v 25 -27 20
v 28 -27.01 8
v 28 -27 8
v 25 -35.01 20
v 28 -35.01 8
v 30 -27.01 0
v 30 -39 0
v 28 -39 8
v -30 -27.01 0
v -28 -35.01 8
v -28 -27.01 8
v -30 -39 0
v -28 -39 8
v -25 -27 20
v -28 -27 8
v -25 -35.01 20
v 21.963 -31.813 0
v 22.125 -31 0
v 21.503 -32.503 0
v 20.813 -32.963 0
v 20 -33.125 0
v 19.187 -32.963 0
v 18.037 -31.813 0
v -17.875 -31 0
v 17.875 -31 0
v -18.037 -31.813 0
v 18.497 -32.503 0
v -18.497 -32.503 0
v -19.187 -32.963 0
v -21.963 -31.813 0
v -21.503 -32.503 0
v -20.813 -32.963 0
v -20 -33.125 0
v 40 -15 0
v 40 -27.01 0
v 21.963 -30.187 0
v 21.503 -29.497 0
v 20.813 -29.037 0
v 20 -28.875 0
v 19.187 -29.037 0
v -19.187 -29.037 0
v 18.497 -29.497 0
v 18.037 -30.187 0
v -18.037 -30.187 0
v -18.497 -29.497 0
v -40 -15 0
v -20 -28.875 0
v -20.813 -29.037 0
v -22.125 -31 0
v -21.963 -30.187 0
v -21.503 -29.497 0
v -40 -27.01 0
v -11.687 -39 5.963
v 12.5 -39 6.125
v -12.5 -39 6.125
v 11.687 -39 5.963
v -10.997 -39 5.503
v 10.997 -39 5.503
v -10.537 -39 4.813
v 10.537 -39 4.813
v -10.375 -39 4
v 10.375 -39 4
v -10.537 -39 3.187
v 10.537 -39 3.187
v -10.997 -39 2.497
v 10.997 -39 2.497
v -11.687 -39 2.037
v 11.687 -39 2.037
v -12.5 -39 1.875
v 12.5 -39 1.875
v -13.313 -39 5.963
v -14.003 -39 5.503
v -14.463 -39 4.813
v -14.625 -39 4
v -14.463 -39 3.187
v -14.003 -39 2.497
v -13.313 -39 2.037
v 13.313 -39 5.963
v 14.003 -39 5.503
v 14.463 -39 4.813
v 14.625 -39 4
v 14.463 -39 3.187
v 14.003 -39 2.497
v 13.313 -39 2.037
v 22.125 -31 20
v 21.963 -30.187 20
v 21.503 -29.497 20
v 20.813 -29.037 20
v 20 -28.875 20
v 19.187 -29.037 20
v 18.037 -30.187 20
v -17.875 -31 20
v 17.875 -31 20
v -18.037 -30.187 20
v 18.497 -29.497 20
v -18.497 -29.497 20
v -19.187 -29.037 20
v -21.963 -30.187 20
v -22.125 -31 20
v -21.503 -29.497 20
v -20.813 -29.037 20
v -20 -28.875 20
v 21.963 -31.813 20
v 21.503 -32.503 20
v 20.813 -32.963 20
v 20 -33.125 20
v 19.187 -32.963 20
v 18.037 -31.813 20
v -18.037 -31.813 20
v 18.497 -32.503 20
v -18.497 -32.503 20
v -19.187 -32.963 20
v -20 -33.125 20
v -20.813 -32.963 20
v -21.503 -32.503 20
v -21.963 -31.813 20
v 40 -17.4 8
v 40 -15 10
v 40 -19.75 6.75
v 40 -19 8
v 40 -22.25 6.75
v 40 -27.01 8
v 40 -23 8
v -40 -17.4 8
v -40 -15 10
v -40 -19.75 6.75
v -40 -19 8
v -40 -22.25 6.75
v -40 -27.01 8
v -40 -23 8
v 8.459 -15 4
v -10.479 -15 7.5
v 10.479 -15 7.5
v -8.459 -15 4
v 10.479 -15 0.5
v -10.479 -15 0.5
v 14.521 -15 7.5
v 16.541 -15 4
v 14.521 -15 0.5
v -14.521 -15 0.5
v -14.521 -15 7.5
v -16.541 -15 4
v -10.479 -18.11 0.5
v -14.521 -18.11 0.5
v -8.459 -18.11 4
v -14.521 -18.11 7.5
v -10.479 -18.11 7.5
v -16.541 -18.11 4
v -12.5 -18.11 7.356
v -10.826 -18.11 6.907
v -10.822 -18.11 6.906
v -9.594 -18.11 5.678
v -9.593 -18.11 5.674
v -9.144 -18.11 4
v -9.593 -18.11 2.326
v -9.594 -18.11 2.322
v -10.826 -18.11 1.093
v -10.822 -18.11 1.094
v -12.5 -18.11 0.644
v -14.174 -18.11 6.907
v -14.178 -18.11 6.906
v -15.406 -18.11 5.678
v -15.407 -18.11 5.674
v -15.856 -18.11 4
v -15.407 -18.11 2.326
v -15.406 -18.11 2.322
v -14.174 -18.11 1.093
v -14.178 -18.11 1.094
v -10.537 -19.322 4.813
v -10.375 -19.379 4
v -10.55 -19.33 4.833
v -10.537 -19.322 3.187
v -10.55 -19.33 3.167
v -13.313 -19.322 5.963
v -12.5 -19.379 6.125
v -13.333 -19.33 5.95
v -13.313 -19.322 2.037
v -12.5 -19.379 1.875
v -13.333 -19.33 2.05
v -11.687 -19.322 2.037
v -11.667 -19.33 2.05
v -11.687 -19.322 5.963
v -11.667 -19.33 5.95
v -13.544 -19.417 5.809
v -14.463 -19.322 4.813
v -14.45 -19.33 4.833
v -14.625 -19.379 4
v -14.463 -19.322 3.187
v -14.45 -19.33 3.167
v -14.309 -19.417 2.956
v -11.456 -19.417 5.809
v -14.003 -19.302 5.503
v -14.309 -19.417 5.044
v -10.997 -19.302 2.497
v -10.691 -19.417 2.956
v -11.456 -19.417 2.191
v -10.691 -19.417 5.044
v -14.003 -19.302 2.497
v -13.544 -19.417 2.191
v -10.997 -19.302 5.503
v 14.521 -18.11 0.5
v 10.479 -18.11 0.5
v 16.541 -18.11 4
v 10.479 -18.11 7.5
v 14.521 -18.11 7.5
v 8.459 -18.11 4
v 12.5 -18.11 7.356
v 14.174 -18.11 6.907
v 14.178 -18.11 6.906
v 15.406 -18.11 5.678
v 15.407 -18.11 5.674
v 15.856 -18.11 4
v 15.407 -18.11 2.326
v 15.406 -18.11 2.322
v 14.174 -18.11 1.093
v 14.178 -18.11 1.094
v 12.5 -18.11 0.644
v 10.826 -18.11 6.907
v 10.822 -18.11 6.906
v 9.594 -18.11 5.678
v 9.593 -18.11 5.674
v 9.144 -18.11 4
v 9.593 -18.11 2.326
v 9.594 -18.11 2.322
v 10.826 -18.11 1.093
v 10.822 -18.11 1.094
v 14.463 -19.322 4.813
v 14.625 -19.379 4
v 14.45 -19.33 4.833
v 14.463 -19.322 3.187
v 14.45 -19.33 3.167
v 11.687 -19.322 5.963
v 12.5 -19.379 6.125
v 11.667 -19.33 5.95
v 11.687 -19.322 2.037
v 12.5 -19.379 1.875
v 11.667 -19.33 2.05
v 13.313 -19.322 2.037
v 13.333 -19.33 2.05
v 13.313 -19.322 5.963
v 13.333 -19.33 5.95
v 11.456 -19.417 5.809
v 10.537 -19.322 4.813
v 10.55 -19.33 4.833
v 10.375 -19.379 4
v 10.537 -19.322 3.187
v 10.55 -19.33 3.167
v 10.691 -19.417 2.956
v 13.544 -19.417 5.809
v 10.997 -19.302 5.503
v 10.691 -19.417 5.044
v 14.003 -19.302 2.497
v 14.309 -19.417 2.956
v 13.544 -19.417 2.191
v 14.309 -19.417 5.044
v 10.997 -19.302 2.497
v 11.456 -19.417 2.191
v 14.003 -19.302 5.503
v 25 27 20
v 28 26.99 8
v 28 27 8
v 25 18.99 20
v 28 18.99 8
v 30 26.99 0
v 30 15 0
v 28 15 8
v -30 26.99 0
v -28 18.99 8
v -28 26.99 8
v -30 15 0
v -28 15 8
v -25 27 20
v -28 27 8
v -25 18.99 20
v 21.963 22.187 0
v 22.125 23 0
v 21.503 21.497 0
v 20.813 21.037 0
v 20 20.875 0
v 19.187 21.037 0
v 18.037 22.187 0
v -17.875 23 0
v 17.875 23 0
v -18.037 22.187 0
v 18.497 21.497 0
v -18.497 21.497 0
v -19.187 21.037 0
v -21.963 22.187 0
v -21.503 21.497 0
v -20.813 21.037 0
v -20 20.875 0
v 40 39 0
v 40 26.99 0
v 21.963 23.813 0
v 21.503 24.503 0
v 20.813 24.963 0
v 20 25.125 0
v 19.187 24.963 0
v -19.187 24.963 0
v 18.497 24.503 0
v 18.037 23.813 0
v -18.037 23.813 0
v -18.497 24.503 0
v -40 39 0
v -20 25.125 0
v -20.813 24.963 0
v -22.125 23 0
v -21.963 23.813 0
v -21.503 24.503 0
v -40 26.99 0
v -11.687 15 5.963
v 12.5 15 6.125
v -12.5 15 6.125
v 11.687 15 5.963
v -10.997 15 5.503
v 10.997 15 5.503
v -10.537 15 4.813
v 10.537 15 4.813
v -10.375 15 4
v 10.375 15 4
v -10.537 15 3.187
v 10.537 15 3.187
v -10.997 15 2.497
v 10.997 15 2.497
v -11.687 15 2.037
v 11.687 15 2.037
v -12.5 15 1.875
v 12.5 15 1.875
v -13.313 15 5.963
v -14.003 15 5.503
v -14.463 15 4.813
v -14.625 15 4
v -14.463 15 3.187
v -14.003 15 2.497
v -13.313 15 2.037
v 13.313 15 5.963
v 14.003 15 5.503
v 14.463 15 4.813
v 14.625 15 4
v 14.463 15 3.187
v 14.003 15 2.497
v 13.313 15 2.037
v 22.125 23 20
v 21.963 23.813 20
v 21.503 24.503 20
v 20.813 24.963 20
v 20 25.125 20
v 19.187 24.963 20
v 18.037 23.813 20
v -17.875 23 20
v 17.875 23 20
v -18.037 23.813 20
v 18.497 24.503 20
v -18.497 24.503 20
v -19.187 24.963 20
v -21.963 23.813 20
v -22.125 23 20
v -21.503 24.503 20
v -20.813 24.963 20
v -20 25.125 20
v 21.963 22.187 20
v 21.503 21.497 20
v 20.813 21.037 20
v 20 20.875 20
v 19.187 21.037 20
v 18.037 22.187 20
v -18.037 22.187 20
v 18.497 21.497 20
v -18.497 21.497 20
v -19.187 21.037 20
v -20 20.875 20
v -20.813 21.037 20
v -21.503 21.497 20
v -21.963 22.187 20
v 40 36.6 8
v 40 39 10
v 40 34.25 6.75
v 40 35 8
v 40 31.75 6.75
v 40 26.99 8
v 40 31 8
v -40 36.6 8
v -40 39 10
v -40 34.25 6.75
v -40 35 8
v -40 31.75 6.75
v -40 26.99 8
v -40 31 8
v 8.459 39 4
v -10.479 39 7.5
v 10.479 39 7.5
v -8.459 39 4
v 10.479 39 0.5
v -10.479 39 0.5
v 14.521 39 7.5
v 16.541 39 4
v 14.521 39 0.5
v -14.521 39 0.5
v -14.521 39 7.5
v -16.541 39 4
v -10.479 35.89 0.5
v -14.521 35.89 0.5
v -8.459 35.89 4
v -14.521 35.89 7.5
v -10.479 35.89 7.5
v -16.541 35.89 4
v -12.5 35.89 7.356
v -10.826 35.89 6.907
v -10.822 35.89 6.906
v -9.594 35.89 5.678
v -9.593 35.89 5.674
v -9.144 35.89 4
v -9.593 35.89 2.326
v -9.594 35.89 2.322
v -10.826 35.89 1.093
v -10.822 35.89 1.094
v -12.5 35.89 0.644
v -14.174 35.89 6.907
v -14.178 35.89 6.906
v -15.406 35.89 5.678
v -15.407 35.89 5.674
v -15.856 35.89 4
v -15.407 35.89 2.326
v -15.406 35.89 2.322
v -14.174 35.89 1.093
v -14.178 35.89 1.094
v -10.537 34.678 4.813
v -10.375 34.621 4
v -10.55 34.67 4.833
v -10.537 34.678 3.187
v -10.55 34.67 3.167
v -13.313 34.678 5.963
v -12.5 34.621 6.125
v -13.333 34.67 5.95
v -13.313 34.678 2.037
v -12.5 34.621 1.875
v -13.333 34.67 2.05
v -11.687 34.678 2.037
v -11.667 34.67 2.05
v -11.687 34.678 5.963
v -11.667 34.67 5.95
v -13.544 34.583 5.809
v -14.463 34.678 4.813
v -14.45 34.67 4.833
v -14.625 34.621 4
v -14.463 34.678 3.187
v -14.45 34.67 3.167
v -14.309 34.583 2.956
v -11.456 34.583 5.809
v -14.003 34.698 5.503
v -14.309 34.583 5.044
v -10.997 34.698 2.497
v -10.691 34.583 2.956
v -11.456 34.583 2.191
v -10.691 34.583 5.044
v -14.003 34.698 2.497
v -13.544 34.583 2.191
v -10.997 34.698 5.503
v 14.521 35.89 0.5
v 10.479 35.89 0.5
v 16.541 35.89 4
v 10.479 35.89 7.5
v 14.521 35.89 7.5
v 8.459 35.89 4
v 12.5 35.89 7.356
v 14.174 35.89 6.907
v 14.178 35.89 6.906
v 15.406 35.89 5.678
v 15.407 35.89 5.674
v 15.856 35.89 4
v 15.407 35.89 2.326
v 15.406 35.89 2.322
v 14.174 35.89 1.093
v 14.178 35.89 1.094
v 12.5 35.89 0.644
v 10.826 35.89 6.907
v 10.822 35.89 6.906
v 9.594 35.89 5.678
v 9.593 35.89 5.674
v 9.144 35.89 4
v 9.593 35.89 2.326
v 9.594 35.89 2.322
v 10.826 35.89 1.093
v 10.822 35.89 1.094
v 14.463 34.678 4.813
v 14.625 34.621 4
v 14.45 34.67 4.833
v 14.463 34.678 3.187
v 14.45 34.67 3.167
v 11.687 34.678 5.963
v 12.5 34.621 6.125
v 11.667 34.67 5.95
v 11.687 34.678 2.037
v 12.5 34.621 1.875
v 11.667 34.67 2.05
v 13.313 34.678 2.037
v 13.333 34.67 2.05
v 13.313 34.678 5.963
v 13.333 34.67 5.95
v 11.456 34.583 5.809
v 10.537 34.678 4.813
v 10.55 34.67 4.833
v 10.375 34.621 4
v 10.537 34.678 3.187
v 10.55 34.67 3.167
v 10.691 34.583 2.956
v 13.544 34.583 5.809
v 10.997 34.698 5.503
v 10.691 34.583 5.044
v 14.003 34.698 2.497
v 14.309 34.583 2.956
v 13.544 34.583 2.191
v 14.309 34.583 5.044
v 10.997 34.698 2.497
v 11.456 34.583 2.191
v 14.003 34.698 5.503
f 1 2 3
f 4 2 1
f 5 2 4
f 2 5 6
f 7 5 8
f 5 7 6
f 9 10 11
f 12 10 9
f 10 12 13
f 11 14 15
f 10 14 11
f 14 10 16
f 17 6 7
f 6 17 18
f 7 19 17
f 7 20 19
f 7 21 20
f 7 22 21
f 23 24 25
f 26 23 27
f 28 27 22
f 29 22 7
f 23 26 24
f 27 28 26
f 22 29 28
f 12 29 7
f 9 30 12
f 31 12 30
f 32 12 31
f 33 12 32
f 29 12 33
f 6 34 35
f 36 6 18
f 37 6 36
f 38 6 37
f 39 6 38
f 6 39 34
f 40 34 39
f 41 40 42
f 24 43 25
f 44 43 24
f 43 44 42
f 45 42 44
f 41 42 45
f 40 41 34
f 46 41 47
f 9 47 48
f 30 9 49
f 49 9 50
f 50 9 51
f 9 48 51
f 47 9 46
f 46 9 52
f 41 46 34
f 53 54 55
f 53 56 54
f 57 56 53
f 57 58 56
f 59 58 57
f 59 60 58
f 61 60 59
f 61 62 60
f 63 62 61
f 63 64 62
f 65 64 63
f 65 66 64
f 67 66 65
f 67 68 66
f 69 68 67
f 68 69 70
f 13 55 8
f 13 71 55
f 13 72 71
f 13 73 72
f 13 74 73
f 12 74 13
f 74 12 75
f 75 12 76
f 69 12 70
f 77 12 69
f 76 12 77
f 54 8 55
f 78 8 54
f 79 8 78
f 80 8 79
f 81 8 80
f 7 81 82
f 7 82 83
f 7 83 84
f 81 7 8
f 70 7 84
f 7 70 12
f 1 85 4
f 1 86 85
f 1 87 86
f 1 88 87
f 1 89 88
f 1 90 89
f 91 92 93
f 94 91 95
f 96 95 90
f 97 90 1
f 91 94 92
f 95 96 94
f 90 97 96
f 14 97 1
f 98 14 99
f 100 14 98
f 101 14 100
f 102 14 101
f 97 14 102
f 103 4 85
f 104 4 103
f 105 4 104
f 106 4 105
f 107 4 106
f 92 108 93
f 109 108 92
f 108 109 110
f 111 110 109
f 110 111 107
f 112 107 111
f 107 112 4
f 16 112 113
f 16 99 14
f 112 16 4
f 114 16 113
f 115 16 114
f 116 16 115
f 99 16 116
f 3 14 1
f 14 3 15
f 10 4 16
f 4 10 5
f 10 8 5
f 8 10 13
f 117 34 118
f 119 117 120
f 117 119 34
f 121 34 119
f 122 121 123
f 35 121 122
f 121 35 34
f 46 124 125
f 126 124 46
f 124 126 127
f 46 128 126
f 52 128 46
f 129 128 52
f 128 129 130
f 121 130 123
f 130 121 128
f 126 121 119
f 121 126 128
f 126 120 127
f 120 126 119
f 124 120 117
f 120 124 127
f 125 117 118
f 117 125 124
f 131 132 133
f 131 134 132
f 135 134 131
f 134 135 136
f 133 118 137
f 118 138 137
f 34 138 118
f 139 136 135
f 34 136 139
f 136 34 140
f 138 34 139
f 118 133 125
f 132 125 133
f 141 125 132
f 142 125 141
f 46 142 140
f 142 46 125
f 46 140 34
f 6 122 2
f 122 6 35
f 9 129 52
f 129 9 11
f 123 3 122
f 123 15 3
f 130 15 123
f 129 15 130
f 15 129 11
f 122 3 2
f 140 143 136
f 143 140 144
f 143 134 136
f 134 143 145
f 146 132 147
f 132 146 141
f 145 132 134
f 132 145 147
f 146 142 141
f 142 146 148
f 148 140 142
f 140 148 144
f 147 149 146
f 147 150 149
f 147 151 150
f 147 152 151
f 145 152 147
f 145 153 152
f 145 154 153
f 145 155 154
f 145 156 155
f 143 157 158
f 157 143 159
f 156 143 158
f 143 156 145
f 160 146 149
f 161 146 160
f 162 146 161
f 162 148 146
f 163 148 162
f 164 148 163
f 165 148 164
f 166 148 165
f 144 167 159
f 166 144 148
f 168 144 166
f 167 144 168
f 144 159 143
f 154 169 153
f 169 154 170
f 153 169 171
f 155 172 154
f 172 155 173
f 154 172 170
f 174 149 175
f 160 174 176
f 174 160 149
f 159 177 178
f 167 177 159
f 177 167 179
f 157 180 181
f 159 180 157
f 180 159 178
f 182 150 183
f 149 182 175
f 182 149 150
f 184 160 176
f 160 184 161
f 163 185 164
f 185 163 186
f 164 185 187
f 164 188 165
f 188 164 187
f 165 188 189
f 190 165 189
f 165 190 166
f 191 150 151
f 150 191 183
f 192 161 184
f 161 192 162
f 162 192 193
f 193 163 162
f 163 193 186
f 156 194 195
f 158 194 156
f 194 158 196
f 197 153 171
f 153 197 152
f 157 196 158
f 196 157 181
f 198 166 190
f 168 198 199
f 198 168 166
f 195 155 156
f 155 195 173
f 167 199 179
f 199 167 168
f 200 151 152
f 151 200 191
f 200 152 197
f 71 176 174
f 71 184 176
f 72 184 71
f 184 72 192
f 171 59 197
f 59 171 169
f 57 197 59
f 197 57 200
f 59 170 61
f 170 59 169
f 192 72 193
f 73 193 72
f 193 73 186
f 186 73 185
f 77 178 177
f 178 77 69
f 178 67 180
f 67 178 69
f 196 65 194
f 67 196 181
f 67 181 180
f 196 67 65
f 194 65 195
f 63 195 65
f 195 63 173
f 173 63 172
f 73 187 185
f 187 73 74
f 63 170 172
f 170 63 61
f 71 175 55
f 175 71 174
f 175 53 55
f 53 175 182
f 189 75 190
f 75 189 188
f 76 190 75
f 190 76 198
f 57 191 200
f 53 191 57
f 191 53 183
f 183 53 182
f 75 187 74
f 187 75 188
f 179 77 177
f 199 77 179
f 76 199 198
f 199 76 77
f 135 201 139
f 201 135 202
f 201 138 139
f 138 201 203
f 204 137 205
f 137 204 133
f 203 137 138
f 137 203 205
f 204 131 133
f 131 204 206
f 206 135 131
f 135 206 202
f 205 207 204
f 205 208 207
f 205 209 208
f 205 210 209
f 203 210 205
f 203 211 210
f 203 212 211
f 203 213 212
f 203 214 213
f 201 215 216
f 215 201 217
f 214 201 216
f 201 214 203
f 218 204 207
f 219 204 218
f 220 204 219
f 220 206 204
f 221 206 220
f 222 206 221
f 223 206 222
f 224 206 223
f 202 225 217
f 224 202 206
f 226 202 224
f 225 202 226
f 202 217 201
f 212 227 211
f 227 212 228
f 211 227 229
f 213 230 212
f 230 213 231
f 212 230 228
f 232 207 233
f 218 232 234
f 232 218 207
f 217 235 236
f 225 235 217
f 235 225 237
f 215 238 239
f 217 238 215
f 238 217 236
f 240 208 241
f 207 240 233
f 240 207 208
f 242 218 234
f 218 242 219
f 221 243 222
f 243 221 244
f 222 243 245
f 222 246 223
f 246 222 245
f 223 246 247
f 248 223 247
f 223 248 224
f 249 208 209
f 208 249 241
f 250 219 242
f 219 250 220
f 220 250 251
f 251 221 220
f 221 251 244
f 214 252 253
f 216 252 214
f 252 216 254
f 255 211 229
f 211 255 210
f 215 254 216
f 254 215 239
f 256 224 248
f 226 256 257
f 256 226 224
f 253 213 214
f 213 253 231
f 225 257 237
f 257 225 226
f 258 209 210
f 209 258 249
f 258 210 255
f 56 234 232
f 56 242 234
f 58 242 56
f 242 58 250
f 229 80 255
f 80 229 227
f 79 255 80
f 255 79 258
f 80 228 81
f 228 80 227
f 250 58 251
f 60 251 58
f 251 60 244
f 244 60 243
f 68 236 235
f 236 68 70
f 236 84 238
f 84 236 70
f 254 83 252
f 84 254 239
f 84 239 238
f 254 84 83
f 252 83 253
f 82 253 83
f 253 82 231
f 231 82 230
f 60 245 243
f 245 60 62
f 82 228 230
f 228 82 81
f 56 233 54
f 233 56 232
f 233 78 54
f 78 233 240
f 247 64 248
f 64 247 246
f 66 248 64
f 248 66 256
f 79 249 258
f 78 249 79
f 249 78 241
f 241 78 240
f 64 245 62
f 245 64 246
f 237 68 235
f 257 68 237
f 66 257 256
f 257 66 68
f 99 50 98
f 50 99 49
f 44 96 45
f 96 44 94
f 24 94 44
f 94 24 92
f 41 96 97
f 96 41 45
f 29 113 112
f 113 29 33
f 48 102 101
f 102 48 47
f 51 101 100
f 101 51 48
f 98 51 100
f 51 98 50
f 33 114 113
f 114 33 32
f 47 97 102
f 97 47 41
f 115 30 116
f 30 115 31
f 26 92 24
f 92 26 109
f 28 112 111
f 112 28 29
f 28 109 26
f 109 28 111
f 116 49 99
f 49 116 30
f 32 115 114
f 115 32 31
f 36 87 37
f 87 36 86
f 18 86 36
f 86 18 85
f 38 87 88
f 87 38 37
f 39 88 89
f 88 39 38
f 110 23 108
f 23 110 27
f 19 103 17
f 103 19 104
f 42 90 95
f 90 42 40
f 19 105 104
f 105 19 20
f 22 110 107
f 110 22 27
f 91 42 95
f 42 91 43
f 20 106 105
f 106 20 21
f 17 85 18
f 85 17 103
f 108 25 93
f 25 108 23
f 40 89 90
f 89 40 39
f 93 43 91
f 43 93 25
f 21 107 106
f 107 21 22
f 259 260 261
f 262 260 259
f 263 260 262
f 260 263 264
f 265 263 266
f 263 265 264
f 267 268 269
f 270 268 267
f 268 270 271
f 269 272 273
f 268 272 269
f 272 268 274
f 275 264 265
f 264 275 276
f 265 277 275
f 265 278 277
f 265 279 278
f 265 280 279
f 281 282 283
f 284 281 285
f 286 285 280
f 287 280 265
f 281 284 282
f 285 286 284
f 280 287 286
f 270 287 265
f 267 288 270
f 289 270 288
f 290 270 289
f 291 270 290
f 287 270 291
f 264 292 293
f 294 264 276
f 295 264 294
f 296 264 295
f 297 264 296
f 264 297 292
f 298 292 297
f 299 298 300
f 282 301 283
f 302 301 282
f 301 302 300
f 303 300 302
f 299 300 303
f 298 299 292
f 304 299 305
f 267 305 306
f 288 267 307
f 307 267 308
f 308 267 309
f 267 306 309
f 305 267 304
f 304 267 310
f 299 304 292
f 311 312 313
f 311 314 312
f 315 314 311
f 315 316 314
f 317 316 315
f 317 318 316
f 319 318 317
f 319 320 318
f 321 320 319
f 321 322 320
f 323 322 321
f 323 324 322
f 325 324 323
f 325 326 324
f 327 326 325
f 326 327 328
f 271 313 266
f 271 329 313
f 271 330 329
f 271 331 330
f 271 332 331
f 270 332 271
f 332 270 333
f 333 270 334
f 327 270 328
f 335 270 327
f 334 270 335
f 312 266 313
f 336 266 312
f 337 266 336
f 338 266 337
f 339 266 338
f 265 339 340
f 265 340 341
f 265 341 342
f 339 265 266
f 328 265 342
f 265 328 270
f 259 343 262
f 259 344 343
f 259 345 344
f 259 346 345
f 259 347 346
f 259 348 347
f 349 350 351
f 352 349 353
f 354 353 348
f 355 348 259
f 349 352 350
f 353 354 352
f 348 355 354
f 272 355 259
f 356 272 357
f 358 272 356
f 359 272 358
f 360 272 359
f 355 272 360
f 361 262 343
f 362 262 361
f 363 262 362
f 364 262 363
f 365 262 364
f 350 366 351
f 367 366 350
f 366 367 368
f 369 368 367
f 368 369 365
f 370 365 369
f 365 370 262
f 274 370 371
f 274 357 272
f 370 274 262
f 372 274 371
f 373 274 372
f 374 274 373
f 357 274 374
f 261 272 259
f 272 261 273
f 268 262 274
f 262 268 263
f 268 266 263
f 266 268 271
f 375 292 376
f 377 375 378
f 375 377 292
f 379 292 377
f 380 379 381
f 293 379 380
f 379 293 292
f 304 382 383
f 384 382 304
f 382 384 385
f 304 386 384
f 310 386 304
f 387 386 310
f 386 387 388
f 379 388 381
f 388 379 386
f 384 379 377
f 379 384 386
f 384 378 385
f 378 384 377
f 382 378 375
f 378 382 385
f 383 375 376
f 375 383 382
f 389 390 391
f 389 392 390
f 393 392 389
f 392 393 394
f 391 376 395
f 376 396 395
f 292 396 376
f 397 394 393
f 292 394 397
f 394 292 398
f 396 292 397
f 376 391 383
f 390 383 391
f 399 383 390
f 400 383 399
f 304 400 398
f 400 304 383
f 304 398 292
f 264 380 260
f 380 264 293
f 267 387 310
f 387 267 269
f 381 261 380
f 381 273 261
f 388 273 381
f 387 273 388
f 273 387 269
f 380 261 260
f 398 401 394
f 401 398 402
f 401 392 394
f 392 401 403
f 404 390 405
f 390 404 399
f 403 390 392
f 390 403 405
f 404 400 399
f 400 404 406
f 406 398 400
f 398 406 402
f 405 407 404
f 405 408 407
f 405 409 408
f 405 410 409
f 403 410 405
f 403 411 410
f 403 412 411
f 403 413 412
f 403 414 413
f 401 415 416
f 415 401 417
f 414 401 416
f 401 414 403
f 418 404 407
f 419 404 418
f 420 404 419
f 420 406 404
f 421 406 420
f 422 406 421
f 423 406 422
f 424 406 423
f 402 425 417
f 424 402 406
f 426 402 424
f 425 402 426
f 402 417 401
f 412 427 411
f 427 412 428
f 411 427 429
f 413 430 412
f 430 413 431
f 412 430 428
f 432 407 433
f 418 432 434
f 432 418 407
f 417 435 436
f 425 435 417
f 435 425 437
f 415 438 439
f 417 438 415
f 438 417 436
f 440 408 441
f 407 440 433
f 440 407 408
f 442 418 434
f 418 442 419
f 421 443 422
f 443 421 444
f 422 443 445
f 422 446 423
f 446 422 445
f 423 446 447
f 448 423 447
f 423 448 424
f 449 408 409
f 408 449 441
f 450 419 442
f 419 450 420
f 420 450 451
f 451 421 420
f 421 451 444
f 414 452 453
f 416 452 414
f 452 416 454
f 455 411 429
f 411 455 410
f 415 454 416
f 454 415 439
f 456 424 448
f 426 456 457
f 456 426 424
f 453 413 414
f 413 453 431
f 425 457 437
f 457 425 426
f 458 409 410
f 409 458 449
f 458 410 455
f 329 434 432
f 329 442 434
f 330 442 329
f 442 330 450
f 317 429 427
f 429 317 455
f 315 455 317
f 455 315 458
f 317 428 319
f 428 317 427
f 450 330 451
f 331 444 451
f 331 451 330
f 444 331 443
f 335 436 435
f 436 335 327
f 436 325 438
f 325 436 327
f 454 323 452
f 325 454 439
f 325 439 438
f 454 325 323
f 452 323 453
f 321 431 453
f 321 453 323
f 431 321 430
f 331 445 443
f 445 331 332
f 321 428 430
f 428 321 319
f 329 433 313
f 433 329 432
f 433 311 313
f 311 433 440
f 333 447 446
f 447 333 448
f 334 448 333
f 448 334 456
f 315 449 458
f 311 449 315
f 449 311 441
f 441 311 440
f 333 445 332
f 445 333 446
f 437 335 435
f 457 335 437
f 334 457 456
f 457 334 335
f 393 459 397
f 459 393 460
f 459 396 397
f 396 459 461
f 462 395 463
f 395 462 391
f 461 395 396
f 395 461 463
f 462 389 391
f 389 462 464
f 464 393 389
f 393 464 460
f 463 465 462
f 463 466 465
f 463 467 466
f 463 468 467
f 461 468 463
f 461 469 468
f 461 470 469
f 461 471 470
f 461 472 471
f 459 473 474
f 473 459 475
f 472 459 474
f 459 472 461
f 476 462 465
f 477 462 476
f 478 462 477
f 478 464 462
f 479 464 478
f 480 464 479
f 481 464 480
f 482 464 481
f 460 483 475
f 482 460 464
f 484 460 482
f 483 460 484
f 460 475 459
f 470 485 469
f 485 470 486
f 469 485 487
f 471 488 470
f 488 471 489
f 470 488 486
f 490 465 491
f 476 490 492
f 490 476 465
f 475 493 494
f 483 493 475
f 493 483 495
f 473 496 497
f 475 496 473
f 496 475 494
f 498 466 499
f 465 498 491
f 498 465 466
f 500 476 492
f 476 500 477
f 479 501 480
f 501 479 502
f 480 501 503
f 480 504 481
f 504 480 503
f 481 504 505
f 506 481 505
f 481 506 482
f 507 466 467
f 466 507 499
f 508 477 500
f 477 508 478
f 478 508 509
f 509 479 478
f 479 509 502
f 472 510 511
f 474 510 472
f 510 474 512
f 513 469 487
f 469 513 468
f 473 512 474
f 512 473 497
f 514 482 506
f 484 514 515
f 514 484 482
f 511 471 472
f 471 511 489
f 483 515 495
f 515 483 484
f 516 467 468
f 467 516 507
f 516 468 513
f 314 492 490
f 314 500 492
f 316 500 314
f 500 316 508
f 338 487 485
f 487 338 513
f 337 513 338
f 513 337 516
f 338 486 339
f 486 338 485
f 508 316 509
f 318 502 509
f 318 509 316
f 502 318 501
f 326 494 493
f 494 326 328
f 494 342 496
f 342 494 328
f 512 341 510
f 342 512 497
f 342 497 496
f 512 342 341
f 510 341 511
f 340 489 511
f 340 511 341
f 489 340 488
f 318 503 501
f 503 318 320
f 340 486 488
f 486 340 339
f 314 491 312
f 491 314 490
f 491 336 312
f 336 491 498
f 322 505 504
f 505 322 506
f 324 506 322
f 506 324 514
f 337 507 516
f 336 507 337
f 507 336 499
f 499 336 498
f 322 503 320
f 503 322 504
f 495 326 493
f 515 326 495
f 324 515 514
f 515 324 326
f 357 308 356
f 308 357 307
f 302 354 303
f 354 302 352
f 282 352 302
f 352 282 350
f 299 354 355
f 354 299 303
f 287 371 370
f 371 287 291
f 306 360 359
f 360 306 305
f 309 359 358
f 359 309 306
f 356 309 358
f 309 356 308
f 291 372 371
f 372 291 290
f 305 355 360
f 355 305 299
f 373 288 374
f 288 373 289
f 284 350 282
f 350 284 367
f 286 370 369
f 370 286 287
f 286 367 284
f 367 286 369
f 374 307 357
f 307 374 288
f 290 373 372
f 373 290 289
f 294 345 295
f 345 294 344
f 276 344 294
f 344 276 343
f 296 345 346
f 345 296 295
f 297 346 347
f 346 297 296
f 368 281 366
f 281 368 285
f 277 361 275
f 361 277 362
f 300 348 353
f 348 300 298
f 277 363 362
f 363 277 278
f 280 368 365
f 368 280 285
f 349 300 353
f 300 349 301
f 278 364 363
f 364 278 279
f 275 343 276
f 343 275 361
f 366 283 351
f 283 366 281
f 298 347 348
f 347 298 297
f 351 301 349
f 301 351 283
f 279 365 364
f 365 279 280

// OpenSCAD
// file: reader-defs.scad
// Default dimensions

m_clearance = 0.25 ;    // Clearance for close-clearance holes
m4 = 4+m_clearance ;    // Close clearance hole for M4 screw
m5 = 5+m_clearance ;    // Close clearance hole for M5 screw
m8 = 8+m_clearance ;    // Close clearance hole for M8 screw

m4_nut_af   = 7 ;       // M4 nut a/f size
m4_nut_t    = 3.1 ;     // M4 nut thickness (for recess)
m4_nylock_t = 4.3 ;     // M4 nylock thickness (for recess)

// Monotype system parameters

// 159/50 = 3.18
// 285.5/90 = 3.172
mt_sprocket_pitch = 3.2 ;   // was: 159/50; paper was riding up on pins after about 20 holes
mt_sprocket_dia   = 1.6 ;   // was: 1.5
mt_sprocket_width = 104.3 ; // Between sprocket hole rows
mt_overall_width  = 110 ;   // Overall width of tape
mt_paper_tickness = 0.08 ;  // Thickness of paper tape

// Winder

shaft_d = m8 ;          // Shaft diameter
core_d = 40 ;           // Core diameter
bevel_d = 72 ;          // Bevel inner diameter
outer_d = 80 ;          // Spool outer diameter
crank_hub_d = 25 ;      // Diameter of crank hub
drive_pulley_d = 60 ;   // Diameter of drive pulley
drive_pulley_t = 10 ;   // Thickness of drive pulley
handle_hub_d = 10 ;     // Diameter of handle end of crank
handle_d = m4 ;         // Diameter of handle
base_fix_d = m4 ;       // Diameter of base fixing screw hole
sup_t = 4 ;             // Default thickness for side supports @@was side_t

crank_l = 40 ;          // Length of crank (between shaft and handle centres

crank_hub_t = 16 ;      // Thickness of crank hub
crank_arm_t = 6 ;       // Thickness of crank arm
crank_end_t = 8 ;       // Thickness of crank handle hub (at end of arm)

spool_side_t = 2.5 ;    // Thickness of carrier spool side
spool_side_rim_t = 1 ;  // Thickness of carrier spool side rim (bevelled)
spool_w_all = 114 ;     // Width of spool (overall between ends)
spool_w_end = 5 ;       // Width of spool (to inside of end)
spool_w_plug = 8 ;      // Width of spool-end plug overlap
spool_w_mid = spool_w_all - 2*spool_w_end ;
                        // width of spool middle spacer

shaft_nut_af = 13 ;     // Nut diameter across faces
shaft_nut_t  = 4 ;      // Nut thickness

handle_nut_af = 7 ;     // Nut diameter across faces
handle_nut_t  = 3 ;     // Nut thickness

winder_side_h = 60 ;    // Height to centre of winder shaft
winder_side_w = 40 ;    // Width base of winder side support
winder_side_t = sup_t ; // Thickness of winder side support
winder_apex_d = 19 ;    // Diameter of apex of winder side support
winder_base_t = 16 ;    // Thickness at base of winder

// Reader bridge

read_l = spool_w_all ;  // Reader bridge length (inner)
read_w = 16 ;           // Width of bridge
read_extra_w = 5 ;      // Extra length for reader bridge for tie-down

guide_w  = 28 ;         // Width of guide flange on bridge
guide_tc = 2 ;          // Guide thickness at core
guide_tr = 1 ;          // Guide thickness at rim
guide_tb = guide_tc-guide_tr ;  // Guide thickness of bevel
guide_eld = 4.5 ;       // EL wire threading hole diameter
tension_bar_d = 4 ;     // Tensioning bar diameter

read_h = 90 ;           // Height of reader bridge above base plate
read_side_t = sup_t ;   // Reader bridge side support thickness
read_side_base_t = 16 ; // Reader bridge side support thickness at base 
read_total_l     = spool_w_all + 2*(read_side_t + read_extra_w) ;
read_side_apex_w = 24 ;
read_side_apex_h = 6 ;
read_side_base_w = 40 ;
read_side_peg_d  = m4 ;

read_groove_w = 2.25 ;  // EL wire goove width
read_groove_d = 2.5 ;   // EL wire groove depth

// Parts for holding phone camera

hold_side_l = 80 ;      // Length is side of holder
hold_side_h = 12 ;      // Height of side above base
hold_side_t1 = 8 ;      // Thickness of side at base
hold_side_t2 = 10 ;      // Thickness of side at top

hold_base_l1 = 60 ;     // Length of base near side
hold_base_l2 = 50 ;     // Length of base towards centre
hold_base_t = 8 ;       // Thickness of base (to accommodate hole)
hold_base_w = 20 ;      // Width of base piece
hold_base_offset = 4 ;  // Thickness of standoff for clamp nut clearance

hold_rail_p = 40 ;      // Distance between rail holes
hold_rail_d = m4 ;      // Diameter of rail holes

hold_fix_p   = 25 ;     // Distance between fixing holes
hold_fix_d   = m4 ;     // Diameter of fixing holes
hold_nut_t   = 3.1 ;    // Thickness of holder fixing nut
hold_nut_af  = 7 ;      // Size across faces of holder fixing nut
hold_fix_o_x = 12 ;     // X-offset from vertical rod to holder fixing holes
hold_fix_o_y = 0 ;      // Y-offset from vertical rod to centre between fixing holes

hold_fix_t = 6 ;        // Thickness of phone holder-to-rod fixing
hold_fix_w = 8 ;        // Width of phone holder-to-rod fixing
hold_fix_l = 80 ;       // Length of phone holder-to-rod fixing
hold_fix_rod_d = 8 ;    // Diameter of phone holder support rod
hold_fix_hub_d = 16 ;   // Diameter of phone holder support hub

hold_fix_plate_l = hold_fix_o_x + hold_fix_rod_d*2 ;
hold_fix_plate_w = hold_fix_p + hold_fix_rod_d*2 ;

hold_slot_o_x1 = 25 ;   // Start of anti-rotation slot
hold_slot_o_x2 = 100 ;  // end of anti-rotation slot

hold_slot_plate_l = hold_slot_o_x2 + hold_fix_rod_d ;

// Bracket to hold phone camera support rod

rod_support_h = 50 ;
rod_support_t = sup_t ;     // Rod support side support thickness
rod_support_base_t = 20 ;   // Rod support side support thickness at base 
rod_support_base_o = 89 ;   // X-offset from reader bar to phone support rod

rod_support_apex_w = 24 ;
rod_support_base_w = 45 ;
rod_support_shell_w = 24 ;

// Baseplate dimensions

base_l   = 360 ; // was 300, 240, 400 ;
base_w   = 130 ;
base_t   = 4 ;
border_w = 8 ;
shell_h  = 8 ;
brace_w  = 8 ;
mount_l  = winder_side_w ;
mount_w  = winder_base_t ;

mount_hole_d = m4 ;
mount_nut_t  = 3 ;
mount_nut_af = 7 ;

foot_lx  = 36 ;     // At top surface of baseplate: tapers away to foot
foot_ly  = 26 ;
foot_h   = 14 ;

plate_px = base_l/2 ;
plate_py = base_w/2 ;

// Misc
delta = 0.01 ;          // Small value to force overlap
clearance = 0.1 ;       // Clearance for close-fitting objects
spacing = outer_d+10 ;  // Object spacing (layout pitch)
part_gap = 10 ;         // Spacing between exploded assembly parts
// main file
// monotype-tape-reader-winder.scad

include <reader-defs.scad> ;

use <reader-common.scad> ;


// Parts for holding phone camera

module phone_holder_rod_fixing_arm() {
    module phone_holder_rod_fixing_shape() {
        // Centre hub on origin, extend X axis, lying on Z=0 plane
        union() {
            cylinder(d=hold_fix_hub_d, h=hold_fix_t) ;
            translate([0,-hold_fix_w/2,0])
                cube(size=[hold_fix_l, hold_fix_w, hold_fix_t], center=false) ;
            translate([hold_fix_l,0,0])
                cylinder(d=hold_fix_w, h=hold_fix_t) ;
        }
    }
    difference() {
        phone_holder_rod_fixing_shape() ;
        shaft_hole(hold_fix_rod_d, hold_fix_t ) ;
        translate([0,0,0])
            rotate([0,0,0])
                union() {
                    translate([hold_fix_l-hold_fix_d,0,0])
                        shaft_hole(hold_fix_d, hold_fix_w ) ;
                    translate([hold_fix_l-hold_fix_p-hold_fix_d,0,0])
                        shaft_hole(hold_fix_d, hold_fix_w ) ;
                } ;
    } ;
}

module phone_holder_rod_fixing_plate() {
    // NOTE: all holes are centred rod diameter from edges
    hole_x = hold_fix_rod_d + hold_fix_o_x ;
    hole_y = hold_fix_plate_w/2 + hold_fix_o_y ;
    module plate_outline() {
        linear_extrude(height=hold_fix_t)
            {
            polygon(
                points=[
                    [0,0], 
                    [hold_fix_rod_d*2, 0], 
                    [hold_fix_plate_l, hole_y-hold_fix_rod_d], 
                    [hold_fix_plate_l, hole_y+hold_fix_rod_d],
                    [hold_fix_rod_d*2, hold_fix_plate_w], 
                    [0, hold_fix_plate_w]
                    ],
                paths=[[0,1,2,3,4,5,0]]
                ) ;
            }
        }
    difference() {
        plate_outline() ;
        // Larger hole
        translate([hole_x, hole_y,0])
            shaft_hole(hold_fix_rod_d, hold_fix_t ) ;
        // Smaller holes
        translate([hold_fix_rod_d, hold_fix_rod_d+hold_fix_p, 0])
            shaft_hole(hold_fix_d, hold_fix_rod_d ) ;
        translate([hold_fix_rod_d, hold_fix_rod_d, 0])
            shaft_hole(hold_fix_d, hold_fix_t ) ;
    }
}

module phone_holder_rod_anti_rotation_plate() {
    // NOTE: all holes are centred rod diameter from edges
    slot_y  = hold_fix_plate_w/2 + hold_fix_o_y ;
    neck_x  = (hold_slot_o_x1 + hold_slot_o_x2)/2 ;
    module plate_outline() {
        linear_extrude(height=hold_fix_t)
            {
            polygon(
                points=[
                    [0,0], 
                    [hold_fix_rod_d*2, 0], 
                    [neck_x,slot_y-hold_fix_rod_d],
                    [hold_slot_o_x2, slot_y-hold_fix_rod_d], 
                    [hold_slot_o_x2, slot_y+hold_fix_rod_d],
                    [neck_x,slot_y+hold_fix_rod_d],
                    [hold_fix_rod_d*2, hold_fix_plate_w], 
                    [0, hold_fix_plate_w]
                    ],
                paths=[[0,1,2,3,4,5,6,7,0]]
                ) ;
            }
        translate([hold_slot_o_x2, slot_y, 0])
            cylinder(h=hold_fix_t, r=hold_fix_rod_d, center=false) ;
        }
    difference() {
        plate_outline() ;
        shaft_slot(hold_slot_o_x1, hold_slot_o_x2, slot_y, hold_fix_rod_d, hold_fix_t) ;
        translate([hold_fix_rod_d, hold_fix_rod_d+hold_fix_p, 0])
            shaft_hole(hold_fix_d, hold_fix_rod_d ) ;
        translate([hold_fix_rod_d, hold_fix_rod_d, 0])
            shaft_hole(hold_fix_d, hold_fix_t ) ;
    }
}

module phone_camera_holder() {
    module phone_holder_base() {
        // Centre baseline on origin, extend X axis, lying on Z=0 plane
        difference() {
            linear_extrude(height=hold_base_t+hold_base_offset)
                polygon(
                    points=[
                        [-hold_base_l1/2,0], [+hold_base_l1/2,0],
                        [-hold_base_l2/2,hold_base_w], [+hold_base_l2/2,hold_base_w]
                        ],
                    paths=[[0,2,3,1,0]]
                    ) ;
            translate([-hold_base_l1/2,hold_side_t1,hold_base_t+delta]) {
                cube(size=[hold_base_l1, hold_base_w, hold_base_offset]) ;
                }
            }
        } ;


    module phone_holder_side() {
        // Thinner edge on Y axis, centred on X axis
        rotate([0,-90,0])
            linear_extrude(height=hold_side_l, center=true)
                {
                //
                //    h   +          +
                //
                //               +
                //               +
                //              +
                //              +
                //               +
                //
                //   -d   +      +
                //        0      t1  t2
                //
                polygon(
                    points=[
                        [0, -delta], 
                        [0, hold_side_h],
                        [hold_side_t2,hold_side_h],
                        [hold_side_t1,hold_side_h*0.8],
                        [hold_side_t1,hold_side_h*0.5+2],  // V-groove for phone buttons
                        [hold_side_t1-1.25,hold_side_h*0.5+1.25],
                        [hold_side_t1-1.25,hold_side_h*0.5-1.25],
                        [hold_side_t1,hold_side_h*0.5-2],
                        [hold_side_t1,-delta],
                        ],
                    paths=[[0,1,2,3,4,5,6,7,8,0]]
                    ) ;
                } ;
        }
    difference() {
        union() {
            rotate([90,0,0]) {
                    phone_holder_base() ;
                }
            phone_holder_side() ;
            } ;
        union() {
            translate([-hold_rail_p/2,-hold_base_t/2,0])
                shaft_hole(hold_rail_d, hold_base_w) ;
            translate([+hold_rail_p/2,-hold_base_t/2,0])
                shaft_hole(hold_rail_d, hold_base_w) ;
            translate([-hold_fix_p/2,hold_side_h,hold_side_t1/2])
                rotate([90,0,0]) {
                    shaft_hole(hold_fix_d, hold_base_t+hold_side_h+hold_base_offset);
                    nut_recess(m4_nut_af, m4_nut_t) ;
                }
            translate([+hold_fix_p/2,hold_side_h,hold_side_t1/2])
                rotate([90,0,0]) {
                    shaft_hole(hold_fix_d, hold_base_t+hold_side_h+hold_base_offset);
                    nut_recess(m4_nut_af, m4_nut_t) ;
                }
            } ;
        }
    }

////-phone_camera_holder
// phone_camera_holder() ;


// Bracket to hold phone camera support rod
    
 module phone_holder_rod_support() {
    // Side in X-Y plane, shaft centre at origin, extends along +X axis
    module side_profile() {
        linear_extrude(height=winder_side_t) {
            polygon(
                points=[
                    [0,-rod_support_apex_w/2], [0,rod_support_apex_w/2],
                    [rod_support_h-rod_support_base_t,-rod_support_base_w/2], [rod_support_h-rod_support_base_t,rod_support_base_w/2],
                    [rod_support_h,-rod_support_base_w/2], [rod_support_h,rod_support_base_w/2],
                    ],
                paths=[[0,2,4, 5,3,1, 0]]
                ) ;
        }
    }
    module side_base() {
        translate([rod_support_h-rod_support_t, -rod_support_base_w/2, 0]) {
            difference() {
                cube(size=[rod_support_t, rod_support_base_w, rod_support_base_t], center=false) ;
                translate([0, rod_support_base_w*0.25, rod_support_base_t/2+rod_support_t/2])
                    rotate([0,90,0])
                        shaft_hole(base_fix_d, rod_support_t) ;
                translate([0, rod_support_base_w*0.75, rod_support_base_t/2+rod_support_t/2])
                    rotate([0,90,0])
                        shaft_hole(base_fix_d, rod_support_t) ;
            }
        }
    }
    module rod_holder() {
        // Rod support block centred on X-Y plane, rod hole aligned with X-axis
        holder_wdth = hold_fix_rod_d*2 ;
        holder_dpth = rod_support_base_t ;
        holder_hght = holder_dpth-holder_wdth/2 ;
        difference() {
            union() {               
                translate([0,0,holder_hght/2])
                    cube(size=[rod_support_t, holder_wdth, holder_hght], center=true) ;
                translate([0,0,holder_dpth-holder_wdth/2])
                    rotate([0,90,0])
                        cylinder(d=holder_wdth,h=rod_support_t, center=true) ;
            }
            translate([-rod_support_t/2,0,holder_dpth-holder_wdth/2])
                rotate([0,90,0])
                    shaft_hole(hold_fix_rod_d, rod_support_t) ;
        }
    }
    union() {
        side_profile() ;
        side_base() ;
        translate([rod_support_t/2,0,0])
            rod_holder() ;
        translate([rod_support_h*0.75,0,0])
            rod_holder() ;
        web_side = rod_support_base_t - rod_support_t ;
        web_xz(rod_support_h-rod_support_t, -rod_support_base_w/2, rod_support_t, -web_side, web_side, rod_support_t) ;
        web_xz(rod_support_h-rod_support_t,  rod_support_base_w/2, rod_support_t, -web_side, web_side, rod_support_t) ;
    } ;
}



// Layout all parts

module layout_reader_camera_holder() {
    // Phone/camera holder
    translate([-spacing*0, -spacing*0.3, 0])
        phone_camera_holder() ;
    translate([spacing*0, spacing*0.3, 0])
        phone_camera_holder() ;
    // translate([-spacing*1.5, spacing*1, 0])
    //     phone_holder_rod_support() ;    
    // translate([spacing*0, spacing*1, 0])
    //     phone_holder_rod_support() ;    
    // translate([0,2*spacing,0])
    //     phone_holder_rod_fixing_arm() ;
    // translate([-spacing*1.5,spacing*2,0])
    //     phone_holder_rod_fixing_plate() ;
    // translate([-spacing*0.5,spacing*2,0])
    //     phone_holder_rod_anti_rotation_plate() ;
    // translate([+spacing*0,spacing*2,0])
    //    phone_holder_rod_fixing_plate() ;
}

////-layout_reader_camera_holder
//translate([spacing*2, spacing*1, 0]) 
    layout_reader_camera_holder() ;

// phone_holder_rod_fixing_plate() ;

// phone_holder_rod_anti_rotation_plate() ;

// shaft_slot(hold_slot_o_x1, hold_slot_o_x2, 75, hold_fix_rod_d, hold_fix_t) ;

// phone_holder_rod_support() ;    
